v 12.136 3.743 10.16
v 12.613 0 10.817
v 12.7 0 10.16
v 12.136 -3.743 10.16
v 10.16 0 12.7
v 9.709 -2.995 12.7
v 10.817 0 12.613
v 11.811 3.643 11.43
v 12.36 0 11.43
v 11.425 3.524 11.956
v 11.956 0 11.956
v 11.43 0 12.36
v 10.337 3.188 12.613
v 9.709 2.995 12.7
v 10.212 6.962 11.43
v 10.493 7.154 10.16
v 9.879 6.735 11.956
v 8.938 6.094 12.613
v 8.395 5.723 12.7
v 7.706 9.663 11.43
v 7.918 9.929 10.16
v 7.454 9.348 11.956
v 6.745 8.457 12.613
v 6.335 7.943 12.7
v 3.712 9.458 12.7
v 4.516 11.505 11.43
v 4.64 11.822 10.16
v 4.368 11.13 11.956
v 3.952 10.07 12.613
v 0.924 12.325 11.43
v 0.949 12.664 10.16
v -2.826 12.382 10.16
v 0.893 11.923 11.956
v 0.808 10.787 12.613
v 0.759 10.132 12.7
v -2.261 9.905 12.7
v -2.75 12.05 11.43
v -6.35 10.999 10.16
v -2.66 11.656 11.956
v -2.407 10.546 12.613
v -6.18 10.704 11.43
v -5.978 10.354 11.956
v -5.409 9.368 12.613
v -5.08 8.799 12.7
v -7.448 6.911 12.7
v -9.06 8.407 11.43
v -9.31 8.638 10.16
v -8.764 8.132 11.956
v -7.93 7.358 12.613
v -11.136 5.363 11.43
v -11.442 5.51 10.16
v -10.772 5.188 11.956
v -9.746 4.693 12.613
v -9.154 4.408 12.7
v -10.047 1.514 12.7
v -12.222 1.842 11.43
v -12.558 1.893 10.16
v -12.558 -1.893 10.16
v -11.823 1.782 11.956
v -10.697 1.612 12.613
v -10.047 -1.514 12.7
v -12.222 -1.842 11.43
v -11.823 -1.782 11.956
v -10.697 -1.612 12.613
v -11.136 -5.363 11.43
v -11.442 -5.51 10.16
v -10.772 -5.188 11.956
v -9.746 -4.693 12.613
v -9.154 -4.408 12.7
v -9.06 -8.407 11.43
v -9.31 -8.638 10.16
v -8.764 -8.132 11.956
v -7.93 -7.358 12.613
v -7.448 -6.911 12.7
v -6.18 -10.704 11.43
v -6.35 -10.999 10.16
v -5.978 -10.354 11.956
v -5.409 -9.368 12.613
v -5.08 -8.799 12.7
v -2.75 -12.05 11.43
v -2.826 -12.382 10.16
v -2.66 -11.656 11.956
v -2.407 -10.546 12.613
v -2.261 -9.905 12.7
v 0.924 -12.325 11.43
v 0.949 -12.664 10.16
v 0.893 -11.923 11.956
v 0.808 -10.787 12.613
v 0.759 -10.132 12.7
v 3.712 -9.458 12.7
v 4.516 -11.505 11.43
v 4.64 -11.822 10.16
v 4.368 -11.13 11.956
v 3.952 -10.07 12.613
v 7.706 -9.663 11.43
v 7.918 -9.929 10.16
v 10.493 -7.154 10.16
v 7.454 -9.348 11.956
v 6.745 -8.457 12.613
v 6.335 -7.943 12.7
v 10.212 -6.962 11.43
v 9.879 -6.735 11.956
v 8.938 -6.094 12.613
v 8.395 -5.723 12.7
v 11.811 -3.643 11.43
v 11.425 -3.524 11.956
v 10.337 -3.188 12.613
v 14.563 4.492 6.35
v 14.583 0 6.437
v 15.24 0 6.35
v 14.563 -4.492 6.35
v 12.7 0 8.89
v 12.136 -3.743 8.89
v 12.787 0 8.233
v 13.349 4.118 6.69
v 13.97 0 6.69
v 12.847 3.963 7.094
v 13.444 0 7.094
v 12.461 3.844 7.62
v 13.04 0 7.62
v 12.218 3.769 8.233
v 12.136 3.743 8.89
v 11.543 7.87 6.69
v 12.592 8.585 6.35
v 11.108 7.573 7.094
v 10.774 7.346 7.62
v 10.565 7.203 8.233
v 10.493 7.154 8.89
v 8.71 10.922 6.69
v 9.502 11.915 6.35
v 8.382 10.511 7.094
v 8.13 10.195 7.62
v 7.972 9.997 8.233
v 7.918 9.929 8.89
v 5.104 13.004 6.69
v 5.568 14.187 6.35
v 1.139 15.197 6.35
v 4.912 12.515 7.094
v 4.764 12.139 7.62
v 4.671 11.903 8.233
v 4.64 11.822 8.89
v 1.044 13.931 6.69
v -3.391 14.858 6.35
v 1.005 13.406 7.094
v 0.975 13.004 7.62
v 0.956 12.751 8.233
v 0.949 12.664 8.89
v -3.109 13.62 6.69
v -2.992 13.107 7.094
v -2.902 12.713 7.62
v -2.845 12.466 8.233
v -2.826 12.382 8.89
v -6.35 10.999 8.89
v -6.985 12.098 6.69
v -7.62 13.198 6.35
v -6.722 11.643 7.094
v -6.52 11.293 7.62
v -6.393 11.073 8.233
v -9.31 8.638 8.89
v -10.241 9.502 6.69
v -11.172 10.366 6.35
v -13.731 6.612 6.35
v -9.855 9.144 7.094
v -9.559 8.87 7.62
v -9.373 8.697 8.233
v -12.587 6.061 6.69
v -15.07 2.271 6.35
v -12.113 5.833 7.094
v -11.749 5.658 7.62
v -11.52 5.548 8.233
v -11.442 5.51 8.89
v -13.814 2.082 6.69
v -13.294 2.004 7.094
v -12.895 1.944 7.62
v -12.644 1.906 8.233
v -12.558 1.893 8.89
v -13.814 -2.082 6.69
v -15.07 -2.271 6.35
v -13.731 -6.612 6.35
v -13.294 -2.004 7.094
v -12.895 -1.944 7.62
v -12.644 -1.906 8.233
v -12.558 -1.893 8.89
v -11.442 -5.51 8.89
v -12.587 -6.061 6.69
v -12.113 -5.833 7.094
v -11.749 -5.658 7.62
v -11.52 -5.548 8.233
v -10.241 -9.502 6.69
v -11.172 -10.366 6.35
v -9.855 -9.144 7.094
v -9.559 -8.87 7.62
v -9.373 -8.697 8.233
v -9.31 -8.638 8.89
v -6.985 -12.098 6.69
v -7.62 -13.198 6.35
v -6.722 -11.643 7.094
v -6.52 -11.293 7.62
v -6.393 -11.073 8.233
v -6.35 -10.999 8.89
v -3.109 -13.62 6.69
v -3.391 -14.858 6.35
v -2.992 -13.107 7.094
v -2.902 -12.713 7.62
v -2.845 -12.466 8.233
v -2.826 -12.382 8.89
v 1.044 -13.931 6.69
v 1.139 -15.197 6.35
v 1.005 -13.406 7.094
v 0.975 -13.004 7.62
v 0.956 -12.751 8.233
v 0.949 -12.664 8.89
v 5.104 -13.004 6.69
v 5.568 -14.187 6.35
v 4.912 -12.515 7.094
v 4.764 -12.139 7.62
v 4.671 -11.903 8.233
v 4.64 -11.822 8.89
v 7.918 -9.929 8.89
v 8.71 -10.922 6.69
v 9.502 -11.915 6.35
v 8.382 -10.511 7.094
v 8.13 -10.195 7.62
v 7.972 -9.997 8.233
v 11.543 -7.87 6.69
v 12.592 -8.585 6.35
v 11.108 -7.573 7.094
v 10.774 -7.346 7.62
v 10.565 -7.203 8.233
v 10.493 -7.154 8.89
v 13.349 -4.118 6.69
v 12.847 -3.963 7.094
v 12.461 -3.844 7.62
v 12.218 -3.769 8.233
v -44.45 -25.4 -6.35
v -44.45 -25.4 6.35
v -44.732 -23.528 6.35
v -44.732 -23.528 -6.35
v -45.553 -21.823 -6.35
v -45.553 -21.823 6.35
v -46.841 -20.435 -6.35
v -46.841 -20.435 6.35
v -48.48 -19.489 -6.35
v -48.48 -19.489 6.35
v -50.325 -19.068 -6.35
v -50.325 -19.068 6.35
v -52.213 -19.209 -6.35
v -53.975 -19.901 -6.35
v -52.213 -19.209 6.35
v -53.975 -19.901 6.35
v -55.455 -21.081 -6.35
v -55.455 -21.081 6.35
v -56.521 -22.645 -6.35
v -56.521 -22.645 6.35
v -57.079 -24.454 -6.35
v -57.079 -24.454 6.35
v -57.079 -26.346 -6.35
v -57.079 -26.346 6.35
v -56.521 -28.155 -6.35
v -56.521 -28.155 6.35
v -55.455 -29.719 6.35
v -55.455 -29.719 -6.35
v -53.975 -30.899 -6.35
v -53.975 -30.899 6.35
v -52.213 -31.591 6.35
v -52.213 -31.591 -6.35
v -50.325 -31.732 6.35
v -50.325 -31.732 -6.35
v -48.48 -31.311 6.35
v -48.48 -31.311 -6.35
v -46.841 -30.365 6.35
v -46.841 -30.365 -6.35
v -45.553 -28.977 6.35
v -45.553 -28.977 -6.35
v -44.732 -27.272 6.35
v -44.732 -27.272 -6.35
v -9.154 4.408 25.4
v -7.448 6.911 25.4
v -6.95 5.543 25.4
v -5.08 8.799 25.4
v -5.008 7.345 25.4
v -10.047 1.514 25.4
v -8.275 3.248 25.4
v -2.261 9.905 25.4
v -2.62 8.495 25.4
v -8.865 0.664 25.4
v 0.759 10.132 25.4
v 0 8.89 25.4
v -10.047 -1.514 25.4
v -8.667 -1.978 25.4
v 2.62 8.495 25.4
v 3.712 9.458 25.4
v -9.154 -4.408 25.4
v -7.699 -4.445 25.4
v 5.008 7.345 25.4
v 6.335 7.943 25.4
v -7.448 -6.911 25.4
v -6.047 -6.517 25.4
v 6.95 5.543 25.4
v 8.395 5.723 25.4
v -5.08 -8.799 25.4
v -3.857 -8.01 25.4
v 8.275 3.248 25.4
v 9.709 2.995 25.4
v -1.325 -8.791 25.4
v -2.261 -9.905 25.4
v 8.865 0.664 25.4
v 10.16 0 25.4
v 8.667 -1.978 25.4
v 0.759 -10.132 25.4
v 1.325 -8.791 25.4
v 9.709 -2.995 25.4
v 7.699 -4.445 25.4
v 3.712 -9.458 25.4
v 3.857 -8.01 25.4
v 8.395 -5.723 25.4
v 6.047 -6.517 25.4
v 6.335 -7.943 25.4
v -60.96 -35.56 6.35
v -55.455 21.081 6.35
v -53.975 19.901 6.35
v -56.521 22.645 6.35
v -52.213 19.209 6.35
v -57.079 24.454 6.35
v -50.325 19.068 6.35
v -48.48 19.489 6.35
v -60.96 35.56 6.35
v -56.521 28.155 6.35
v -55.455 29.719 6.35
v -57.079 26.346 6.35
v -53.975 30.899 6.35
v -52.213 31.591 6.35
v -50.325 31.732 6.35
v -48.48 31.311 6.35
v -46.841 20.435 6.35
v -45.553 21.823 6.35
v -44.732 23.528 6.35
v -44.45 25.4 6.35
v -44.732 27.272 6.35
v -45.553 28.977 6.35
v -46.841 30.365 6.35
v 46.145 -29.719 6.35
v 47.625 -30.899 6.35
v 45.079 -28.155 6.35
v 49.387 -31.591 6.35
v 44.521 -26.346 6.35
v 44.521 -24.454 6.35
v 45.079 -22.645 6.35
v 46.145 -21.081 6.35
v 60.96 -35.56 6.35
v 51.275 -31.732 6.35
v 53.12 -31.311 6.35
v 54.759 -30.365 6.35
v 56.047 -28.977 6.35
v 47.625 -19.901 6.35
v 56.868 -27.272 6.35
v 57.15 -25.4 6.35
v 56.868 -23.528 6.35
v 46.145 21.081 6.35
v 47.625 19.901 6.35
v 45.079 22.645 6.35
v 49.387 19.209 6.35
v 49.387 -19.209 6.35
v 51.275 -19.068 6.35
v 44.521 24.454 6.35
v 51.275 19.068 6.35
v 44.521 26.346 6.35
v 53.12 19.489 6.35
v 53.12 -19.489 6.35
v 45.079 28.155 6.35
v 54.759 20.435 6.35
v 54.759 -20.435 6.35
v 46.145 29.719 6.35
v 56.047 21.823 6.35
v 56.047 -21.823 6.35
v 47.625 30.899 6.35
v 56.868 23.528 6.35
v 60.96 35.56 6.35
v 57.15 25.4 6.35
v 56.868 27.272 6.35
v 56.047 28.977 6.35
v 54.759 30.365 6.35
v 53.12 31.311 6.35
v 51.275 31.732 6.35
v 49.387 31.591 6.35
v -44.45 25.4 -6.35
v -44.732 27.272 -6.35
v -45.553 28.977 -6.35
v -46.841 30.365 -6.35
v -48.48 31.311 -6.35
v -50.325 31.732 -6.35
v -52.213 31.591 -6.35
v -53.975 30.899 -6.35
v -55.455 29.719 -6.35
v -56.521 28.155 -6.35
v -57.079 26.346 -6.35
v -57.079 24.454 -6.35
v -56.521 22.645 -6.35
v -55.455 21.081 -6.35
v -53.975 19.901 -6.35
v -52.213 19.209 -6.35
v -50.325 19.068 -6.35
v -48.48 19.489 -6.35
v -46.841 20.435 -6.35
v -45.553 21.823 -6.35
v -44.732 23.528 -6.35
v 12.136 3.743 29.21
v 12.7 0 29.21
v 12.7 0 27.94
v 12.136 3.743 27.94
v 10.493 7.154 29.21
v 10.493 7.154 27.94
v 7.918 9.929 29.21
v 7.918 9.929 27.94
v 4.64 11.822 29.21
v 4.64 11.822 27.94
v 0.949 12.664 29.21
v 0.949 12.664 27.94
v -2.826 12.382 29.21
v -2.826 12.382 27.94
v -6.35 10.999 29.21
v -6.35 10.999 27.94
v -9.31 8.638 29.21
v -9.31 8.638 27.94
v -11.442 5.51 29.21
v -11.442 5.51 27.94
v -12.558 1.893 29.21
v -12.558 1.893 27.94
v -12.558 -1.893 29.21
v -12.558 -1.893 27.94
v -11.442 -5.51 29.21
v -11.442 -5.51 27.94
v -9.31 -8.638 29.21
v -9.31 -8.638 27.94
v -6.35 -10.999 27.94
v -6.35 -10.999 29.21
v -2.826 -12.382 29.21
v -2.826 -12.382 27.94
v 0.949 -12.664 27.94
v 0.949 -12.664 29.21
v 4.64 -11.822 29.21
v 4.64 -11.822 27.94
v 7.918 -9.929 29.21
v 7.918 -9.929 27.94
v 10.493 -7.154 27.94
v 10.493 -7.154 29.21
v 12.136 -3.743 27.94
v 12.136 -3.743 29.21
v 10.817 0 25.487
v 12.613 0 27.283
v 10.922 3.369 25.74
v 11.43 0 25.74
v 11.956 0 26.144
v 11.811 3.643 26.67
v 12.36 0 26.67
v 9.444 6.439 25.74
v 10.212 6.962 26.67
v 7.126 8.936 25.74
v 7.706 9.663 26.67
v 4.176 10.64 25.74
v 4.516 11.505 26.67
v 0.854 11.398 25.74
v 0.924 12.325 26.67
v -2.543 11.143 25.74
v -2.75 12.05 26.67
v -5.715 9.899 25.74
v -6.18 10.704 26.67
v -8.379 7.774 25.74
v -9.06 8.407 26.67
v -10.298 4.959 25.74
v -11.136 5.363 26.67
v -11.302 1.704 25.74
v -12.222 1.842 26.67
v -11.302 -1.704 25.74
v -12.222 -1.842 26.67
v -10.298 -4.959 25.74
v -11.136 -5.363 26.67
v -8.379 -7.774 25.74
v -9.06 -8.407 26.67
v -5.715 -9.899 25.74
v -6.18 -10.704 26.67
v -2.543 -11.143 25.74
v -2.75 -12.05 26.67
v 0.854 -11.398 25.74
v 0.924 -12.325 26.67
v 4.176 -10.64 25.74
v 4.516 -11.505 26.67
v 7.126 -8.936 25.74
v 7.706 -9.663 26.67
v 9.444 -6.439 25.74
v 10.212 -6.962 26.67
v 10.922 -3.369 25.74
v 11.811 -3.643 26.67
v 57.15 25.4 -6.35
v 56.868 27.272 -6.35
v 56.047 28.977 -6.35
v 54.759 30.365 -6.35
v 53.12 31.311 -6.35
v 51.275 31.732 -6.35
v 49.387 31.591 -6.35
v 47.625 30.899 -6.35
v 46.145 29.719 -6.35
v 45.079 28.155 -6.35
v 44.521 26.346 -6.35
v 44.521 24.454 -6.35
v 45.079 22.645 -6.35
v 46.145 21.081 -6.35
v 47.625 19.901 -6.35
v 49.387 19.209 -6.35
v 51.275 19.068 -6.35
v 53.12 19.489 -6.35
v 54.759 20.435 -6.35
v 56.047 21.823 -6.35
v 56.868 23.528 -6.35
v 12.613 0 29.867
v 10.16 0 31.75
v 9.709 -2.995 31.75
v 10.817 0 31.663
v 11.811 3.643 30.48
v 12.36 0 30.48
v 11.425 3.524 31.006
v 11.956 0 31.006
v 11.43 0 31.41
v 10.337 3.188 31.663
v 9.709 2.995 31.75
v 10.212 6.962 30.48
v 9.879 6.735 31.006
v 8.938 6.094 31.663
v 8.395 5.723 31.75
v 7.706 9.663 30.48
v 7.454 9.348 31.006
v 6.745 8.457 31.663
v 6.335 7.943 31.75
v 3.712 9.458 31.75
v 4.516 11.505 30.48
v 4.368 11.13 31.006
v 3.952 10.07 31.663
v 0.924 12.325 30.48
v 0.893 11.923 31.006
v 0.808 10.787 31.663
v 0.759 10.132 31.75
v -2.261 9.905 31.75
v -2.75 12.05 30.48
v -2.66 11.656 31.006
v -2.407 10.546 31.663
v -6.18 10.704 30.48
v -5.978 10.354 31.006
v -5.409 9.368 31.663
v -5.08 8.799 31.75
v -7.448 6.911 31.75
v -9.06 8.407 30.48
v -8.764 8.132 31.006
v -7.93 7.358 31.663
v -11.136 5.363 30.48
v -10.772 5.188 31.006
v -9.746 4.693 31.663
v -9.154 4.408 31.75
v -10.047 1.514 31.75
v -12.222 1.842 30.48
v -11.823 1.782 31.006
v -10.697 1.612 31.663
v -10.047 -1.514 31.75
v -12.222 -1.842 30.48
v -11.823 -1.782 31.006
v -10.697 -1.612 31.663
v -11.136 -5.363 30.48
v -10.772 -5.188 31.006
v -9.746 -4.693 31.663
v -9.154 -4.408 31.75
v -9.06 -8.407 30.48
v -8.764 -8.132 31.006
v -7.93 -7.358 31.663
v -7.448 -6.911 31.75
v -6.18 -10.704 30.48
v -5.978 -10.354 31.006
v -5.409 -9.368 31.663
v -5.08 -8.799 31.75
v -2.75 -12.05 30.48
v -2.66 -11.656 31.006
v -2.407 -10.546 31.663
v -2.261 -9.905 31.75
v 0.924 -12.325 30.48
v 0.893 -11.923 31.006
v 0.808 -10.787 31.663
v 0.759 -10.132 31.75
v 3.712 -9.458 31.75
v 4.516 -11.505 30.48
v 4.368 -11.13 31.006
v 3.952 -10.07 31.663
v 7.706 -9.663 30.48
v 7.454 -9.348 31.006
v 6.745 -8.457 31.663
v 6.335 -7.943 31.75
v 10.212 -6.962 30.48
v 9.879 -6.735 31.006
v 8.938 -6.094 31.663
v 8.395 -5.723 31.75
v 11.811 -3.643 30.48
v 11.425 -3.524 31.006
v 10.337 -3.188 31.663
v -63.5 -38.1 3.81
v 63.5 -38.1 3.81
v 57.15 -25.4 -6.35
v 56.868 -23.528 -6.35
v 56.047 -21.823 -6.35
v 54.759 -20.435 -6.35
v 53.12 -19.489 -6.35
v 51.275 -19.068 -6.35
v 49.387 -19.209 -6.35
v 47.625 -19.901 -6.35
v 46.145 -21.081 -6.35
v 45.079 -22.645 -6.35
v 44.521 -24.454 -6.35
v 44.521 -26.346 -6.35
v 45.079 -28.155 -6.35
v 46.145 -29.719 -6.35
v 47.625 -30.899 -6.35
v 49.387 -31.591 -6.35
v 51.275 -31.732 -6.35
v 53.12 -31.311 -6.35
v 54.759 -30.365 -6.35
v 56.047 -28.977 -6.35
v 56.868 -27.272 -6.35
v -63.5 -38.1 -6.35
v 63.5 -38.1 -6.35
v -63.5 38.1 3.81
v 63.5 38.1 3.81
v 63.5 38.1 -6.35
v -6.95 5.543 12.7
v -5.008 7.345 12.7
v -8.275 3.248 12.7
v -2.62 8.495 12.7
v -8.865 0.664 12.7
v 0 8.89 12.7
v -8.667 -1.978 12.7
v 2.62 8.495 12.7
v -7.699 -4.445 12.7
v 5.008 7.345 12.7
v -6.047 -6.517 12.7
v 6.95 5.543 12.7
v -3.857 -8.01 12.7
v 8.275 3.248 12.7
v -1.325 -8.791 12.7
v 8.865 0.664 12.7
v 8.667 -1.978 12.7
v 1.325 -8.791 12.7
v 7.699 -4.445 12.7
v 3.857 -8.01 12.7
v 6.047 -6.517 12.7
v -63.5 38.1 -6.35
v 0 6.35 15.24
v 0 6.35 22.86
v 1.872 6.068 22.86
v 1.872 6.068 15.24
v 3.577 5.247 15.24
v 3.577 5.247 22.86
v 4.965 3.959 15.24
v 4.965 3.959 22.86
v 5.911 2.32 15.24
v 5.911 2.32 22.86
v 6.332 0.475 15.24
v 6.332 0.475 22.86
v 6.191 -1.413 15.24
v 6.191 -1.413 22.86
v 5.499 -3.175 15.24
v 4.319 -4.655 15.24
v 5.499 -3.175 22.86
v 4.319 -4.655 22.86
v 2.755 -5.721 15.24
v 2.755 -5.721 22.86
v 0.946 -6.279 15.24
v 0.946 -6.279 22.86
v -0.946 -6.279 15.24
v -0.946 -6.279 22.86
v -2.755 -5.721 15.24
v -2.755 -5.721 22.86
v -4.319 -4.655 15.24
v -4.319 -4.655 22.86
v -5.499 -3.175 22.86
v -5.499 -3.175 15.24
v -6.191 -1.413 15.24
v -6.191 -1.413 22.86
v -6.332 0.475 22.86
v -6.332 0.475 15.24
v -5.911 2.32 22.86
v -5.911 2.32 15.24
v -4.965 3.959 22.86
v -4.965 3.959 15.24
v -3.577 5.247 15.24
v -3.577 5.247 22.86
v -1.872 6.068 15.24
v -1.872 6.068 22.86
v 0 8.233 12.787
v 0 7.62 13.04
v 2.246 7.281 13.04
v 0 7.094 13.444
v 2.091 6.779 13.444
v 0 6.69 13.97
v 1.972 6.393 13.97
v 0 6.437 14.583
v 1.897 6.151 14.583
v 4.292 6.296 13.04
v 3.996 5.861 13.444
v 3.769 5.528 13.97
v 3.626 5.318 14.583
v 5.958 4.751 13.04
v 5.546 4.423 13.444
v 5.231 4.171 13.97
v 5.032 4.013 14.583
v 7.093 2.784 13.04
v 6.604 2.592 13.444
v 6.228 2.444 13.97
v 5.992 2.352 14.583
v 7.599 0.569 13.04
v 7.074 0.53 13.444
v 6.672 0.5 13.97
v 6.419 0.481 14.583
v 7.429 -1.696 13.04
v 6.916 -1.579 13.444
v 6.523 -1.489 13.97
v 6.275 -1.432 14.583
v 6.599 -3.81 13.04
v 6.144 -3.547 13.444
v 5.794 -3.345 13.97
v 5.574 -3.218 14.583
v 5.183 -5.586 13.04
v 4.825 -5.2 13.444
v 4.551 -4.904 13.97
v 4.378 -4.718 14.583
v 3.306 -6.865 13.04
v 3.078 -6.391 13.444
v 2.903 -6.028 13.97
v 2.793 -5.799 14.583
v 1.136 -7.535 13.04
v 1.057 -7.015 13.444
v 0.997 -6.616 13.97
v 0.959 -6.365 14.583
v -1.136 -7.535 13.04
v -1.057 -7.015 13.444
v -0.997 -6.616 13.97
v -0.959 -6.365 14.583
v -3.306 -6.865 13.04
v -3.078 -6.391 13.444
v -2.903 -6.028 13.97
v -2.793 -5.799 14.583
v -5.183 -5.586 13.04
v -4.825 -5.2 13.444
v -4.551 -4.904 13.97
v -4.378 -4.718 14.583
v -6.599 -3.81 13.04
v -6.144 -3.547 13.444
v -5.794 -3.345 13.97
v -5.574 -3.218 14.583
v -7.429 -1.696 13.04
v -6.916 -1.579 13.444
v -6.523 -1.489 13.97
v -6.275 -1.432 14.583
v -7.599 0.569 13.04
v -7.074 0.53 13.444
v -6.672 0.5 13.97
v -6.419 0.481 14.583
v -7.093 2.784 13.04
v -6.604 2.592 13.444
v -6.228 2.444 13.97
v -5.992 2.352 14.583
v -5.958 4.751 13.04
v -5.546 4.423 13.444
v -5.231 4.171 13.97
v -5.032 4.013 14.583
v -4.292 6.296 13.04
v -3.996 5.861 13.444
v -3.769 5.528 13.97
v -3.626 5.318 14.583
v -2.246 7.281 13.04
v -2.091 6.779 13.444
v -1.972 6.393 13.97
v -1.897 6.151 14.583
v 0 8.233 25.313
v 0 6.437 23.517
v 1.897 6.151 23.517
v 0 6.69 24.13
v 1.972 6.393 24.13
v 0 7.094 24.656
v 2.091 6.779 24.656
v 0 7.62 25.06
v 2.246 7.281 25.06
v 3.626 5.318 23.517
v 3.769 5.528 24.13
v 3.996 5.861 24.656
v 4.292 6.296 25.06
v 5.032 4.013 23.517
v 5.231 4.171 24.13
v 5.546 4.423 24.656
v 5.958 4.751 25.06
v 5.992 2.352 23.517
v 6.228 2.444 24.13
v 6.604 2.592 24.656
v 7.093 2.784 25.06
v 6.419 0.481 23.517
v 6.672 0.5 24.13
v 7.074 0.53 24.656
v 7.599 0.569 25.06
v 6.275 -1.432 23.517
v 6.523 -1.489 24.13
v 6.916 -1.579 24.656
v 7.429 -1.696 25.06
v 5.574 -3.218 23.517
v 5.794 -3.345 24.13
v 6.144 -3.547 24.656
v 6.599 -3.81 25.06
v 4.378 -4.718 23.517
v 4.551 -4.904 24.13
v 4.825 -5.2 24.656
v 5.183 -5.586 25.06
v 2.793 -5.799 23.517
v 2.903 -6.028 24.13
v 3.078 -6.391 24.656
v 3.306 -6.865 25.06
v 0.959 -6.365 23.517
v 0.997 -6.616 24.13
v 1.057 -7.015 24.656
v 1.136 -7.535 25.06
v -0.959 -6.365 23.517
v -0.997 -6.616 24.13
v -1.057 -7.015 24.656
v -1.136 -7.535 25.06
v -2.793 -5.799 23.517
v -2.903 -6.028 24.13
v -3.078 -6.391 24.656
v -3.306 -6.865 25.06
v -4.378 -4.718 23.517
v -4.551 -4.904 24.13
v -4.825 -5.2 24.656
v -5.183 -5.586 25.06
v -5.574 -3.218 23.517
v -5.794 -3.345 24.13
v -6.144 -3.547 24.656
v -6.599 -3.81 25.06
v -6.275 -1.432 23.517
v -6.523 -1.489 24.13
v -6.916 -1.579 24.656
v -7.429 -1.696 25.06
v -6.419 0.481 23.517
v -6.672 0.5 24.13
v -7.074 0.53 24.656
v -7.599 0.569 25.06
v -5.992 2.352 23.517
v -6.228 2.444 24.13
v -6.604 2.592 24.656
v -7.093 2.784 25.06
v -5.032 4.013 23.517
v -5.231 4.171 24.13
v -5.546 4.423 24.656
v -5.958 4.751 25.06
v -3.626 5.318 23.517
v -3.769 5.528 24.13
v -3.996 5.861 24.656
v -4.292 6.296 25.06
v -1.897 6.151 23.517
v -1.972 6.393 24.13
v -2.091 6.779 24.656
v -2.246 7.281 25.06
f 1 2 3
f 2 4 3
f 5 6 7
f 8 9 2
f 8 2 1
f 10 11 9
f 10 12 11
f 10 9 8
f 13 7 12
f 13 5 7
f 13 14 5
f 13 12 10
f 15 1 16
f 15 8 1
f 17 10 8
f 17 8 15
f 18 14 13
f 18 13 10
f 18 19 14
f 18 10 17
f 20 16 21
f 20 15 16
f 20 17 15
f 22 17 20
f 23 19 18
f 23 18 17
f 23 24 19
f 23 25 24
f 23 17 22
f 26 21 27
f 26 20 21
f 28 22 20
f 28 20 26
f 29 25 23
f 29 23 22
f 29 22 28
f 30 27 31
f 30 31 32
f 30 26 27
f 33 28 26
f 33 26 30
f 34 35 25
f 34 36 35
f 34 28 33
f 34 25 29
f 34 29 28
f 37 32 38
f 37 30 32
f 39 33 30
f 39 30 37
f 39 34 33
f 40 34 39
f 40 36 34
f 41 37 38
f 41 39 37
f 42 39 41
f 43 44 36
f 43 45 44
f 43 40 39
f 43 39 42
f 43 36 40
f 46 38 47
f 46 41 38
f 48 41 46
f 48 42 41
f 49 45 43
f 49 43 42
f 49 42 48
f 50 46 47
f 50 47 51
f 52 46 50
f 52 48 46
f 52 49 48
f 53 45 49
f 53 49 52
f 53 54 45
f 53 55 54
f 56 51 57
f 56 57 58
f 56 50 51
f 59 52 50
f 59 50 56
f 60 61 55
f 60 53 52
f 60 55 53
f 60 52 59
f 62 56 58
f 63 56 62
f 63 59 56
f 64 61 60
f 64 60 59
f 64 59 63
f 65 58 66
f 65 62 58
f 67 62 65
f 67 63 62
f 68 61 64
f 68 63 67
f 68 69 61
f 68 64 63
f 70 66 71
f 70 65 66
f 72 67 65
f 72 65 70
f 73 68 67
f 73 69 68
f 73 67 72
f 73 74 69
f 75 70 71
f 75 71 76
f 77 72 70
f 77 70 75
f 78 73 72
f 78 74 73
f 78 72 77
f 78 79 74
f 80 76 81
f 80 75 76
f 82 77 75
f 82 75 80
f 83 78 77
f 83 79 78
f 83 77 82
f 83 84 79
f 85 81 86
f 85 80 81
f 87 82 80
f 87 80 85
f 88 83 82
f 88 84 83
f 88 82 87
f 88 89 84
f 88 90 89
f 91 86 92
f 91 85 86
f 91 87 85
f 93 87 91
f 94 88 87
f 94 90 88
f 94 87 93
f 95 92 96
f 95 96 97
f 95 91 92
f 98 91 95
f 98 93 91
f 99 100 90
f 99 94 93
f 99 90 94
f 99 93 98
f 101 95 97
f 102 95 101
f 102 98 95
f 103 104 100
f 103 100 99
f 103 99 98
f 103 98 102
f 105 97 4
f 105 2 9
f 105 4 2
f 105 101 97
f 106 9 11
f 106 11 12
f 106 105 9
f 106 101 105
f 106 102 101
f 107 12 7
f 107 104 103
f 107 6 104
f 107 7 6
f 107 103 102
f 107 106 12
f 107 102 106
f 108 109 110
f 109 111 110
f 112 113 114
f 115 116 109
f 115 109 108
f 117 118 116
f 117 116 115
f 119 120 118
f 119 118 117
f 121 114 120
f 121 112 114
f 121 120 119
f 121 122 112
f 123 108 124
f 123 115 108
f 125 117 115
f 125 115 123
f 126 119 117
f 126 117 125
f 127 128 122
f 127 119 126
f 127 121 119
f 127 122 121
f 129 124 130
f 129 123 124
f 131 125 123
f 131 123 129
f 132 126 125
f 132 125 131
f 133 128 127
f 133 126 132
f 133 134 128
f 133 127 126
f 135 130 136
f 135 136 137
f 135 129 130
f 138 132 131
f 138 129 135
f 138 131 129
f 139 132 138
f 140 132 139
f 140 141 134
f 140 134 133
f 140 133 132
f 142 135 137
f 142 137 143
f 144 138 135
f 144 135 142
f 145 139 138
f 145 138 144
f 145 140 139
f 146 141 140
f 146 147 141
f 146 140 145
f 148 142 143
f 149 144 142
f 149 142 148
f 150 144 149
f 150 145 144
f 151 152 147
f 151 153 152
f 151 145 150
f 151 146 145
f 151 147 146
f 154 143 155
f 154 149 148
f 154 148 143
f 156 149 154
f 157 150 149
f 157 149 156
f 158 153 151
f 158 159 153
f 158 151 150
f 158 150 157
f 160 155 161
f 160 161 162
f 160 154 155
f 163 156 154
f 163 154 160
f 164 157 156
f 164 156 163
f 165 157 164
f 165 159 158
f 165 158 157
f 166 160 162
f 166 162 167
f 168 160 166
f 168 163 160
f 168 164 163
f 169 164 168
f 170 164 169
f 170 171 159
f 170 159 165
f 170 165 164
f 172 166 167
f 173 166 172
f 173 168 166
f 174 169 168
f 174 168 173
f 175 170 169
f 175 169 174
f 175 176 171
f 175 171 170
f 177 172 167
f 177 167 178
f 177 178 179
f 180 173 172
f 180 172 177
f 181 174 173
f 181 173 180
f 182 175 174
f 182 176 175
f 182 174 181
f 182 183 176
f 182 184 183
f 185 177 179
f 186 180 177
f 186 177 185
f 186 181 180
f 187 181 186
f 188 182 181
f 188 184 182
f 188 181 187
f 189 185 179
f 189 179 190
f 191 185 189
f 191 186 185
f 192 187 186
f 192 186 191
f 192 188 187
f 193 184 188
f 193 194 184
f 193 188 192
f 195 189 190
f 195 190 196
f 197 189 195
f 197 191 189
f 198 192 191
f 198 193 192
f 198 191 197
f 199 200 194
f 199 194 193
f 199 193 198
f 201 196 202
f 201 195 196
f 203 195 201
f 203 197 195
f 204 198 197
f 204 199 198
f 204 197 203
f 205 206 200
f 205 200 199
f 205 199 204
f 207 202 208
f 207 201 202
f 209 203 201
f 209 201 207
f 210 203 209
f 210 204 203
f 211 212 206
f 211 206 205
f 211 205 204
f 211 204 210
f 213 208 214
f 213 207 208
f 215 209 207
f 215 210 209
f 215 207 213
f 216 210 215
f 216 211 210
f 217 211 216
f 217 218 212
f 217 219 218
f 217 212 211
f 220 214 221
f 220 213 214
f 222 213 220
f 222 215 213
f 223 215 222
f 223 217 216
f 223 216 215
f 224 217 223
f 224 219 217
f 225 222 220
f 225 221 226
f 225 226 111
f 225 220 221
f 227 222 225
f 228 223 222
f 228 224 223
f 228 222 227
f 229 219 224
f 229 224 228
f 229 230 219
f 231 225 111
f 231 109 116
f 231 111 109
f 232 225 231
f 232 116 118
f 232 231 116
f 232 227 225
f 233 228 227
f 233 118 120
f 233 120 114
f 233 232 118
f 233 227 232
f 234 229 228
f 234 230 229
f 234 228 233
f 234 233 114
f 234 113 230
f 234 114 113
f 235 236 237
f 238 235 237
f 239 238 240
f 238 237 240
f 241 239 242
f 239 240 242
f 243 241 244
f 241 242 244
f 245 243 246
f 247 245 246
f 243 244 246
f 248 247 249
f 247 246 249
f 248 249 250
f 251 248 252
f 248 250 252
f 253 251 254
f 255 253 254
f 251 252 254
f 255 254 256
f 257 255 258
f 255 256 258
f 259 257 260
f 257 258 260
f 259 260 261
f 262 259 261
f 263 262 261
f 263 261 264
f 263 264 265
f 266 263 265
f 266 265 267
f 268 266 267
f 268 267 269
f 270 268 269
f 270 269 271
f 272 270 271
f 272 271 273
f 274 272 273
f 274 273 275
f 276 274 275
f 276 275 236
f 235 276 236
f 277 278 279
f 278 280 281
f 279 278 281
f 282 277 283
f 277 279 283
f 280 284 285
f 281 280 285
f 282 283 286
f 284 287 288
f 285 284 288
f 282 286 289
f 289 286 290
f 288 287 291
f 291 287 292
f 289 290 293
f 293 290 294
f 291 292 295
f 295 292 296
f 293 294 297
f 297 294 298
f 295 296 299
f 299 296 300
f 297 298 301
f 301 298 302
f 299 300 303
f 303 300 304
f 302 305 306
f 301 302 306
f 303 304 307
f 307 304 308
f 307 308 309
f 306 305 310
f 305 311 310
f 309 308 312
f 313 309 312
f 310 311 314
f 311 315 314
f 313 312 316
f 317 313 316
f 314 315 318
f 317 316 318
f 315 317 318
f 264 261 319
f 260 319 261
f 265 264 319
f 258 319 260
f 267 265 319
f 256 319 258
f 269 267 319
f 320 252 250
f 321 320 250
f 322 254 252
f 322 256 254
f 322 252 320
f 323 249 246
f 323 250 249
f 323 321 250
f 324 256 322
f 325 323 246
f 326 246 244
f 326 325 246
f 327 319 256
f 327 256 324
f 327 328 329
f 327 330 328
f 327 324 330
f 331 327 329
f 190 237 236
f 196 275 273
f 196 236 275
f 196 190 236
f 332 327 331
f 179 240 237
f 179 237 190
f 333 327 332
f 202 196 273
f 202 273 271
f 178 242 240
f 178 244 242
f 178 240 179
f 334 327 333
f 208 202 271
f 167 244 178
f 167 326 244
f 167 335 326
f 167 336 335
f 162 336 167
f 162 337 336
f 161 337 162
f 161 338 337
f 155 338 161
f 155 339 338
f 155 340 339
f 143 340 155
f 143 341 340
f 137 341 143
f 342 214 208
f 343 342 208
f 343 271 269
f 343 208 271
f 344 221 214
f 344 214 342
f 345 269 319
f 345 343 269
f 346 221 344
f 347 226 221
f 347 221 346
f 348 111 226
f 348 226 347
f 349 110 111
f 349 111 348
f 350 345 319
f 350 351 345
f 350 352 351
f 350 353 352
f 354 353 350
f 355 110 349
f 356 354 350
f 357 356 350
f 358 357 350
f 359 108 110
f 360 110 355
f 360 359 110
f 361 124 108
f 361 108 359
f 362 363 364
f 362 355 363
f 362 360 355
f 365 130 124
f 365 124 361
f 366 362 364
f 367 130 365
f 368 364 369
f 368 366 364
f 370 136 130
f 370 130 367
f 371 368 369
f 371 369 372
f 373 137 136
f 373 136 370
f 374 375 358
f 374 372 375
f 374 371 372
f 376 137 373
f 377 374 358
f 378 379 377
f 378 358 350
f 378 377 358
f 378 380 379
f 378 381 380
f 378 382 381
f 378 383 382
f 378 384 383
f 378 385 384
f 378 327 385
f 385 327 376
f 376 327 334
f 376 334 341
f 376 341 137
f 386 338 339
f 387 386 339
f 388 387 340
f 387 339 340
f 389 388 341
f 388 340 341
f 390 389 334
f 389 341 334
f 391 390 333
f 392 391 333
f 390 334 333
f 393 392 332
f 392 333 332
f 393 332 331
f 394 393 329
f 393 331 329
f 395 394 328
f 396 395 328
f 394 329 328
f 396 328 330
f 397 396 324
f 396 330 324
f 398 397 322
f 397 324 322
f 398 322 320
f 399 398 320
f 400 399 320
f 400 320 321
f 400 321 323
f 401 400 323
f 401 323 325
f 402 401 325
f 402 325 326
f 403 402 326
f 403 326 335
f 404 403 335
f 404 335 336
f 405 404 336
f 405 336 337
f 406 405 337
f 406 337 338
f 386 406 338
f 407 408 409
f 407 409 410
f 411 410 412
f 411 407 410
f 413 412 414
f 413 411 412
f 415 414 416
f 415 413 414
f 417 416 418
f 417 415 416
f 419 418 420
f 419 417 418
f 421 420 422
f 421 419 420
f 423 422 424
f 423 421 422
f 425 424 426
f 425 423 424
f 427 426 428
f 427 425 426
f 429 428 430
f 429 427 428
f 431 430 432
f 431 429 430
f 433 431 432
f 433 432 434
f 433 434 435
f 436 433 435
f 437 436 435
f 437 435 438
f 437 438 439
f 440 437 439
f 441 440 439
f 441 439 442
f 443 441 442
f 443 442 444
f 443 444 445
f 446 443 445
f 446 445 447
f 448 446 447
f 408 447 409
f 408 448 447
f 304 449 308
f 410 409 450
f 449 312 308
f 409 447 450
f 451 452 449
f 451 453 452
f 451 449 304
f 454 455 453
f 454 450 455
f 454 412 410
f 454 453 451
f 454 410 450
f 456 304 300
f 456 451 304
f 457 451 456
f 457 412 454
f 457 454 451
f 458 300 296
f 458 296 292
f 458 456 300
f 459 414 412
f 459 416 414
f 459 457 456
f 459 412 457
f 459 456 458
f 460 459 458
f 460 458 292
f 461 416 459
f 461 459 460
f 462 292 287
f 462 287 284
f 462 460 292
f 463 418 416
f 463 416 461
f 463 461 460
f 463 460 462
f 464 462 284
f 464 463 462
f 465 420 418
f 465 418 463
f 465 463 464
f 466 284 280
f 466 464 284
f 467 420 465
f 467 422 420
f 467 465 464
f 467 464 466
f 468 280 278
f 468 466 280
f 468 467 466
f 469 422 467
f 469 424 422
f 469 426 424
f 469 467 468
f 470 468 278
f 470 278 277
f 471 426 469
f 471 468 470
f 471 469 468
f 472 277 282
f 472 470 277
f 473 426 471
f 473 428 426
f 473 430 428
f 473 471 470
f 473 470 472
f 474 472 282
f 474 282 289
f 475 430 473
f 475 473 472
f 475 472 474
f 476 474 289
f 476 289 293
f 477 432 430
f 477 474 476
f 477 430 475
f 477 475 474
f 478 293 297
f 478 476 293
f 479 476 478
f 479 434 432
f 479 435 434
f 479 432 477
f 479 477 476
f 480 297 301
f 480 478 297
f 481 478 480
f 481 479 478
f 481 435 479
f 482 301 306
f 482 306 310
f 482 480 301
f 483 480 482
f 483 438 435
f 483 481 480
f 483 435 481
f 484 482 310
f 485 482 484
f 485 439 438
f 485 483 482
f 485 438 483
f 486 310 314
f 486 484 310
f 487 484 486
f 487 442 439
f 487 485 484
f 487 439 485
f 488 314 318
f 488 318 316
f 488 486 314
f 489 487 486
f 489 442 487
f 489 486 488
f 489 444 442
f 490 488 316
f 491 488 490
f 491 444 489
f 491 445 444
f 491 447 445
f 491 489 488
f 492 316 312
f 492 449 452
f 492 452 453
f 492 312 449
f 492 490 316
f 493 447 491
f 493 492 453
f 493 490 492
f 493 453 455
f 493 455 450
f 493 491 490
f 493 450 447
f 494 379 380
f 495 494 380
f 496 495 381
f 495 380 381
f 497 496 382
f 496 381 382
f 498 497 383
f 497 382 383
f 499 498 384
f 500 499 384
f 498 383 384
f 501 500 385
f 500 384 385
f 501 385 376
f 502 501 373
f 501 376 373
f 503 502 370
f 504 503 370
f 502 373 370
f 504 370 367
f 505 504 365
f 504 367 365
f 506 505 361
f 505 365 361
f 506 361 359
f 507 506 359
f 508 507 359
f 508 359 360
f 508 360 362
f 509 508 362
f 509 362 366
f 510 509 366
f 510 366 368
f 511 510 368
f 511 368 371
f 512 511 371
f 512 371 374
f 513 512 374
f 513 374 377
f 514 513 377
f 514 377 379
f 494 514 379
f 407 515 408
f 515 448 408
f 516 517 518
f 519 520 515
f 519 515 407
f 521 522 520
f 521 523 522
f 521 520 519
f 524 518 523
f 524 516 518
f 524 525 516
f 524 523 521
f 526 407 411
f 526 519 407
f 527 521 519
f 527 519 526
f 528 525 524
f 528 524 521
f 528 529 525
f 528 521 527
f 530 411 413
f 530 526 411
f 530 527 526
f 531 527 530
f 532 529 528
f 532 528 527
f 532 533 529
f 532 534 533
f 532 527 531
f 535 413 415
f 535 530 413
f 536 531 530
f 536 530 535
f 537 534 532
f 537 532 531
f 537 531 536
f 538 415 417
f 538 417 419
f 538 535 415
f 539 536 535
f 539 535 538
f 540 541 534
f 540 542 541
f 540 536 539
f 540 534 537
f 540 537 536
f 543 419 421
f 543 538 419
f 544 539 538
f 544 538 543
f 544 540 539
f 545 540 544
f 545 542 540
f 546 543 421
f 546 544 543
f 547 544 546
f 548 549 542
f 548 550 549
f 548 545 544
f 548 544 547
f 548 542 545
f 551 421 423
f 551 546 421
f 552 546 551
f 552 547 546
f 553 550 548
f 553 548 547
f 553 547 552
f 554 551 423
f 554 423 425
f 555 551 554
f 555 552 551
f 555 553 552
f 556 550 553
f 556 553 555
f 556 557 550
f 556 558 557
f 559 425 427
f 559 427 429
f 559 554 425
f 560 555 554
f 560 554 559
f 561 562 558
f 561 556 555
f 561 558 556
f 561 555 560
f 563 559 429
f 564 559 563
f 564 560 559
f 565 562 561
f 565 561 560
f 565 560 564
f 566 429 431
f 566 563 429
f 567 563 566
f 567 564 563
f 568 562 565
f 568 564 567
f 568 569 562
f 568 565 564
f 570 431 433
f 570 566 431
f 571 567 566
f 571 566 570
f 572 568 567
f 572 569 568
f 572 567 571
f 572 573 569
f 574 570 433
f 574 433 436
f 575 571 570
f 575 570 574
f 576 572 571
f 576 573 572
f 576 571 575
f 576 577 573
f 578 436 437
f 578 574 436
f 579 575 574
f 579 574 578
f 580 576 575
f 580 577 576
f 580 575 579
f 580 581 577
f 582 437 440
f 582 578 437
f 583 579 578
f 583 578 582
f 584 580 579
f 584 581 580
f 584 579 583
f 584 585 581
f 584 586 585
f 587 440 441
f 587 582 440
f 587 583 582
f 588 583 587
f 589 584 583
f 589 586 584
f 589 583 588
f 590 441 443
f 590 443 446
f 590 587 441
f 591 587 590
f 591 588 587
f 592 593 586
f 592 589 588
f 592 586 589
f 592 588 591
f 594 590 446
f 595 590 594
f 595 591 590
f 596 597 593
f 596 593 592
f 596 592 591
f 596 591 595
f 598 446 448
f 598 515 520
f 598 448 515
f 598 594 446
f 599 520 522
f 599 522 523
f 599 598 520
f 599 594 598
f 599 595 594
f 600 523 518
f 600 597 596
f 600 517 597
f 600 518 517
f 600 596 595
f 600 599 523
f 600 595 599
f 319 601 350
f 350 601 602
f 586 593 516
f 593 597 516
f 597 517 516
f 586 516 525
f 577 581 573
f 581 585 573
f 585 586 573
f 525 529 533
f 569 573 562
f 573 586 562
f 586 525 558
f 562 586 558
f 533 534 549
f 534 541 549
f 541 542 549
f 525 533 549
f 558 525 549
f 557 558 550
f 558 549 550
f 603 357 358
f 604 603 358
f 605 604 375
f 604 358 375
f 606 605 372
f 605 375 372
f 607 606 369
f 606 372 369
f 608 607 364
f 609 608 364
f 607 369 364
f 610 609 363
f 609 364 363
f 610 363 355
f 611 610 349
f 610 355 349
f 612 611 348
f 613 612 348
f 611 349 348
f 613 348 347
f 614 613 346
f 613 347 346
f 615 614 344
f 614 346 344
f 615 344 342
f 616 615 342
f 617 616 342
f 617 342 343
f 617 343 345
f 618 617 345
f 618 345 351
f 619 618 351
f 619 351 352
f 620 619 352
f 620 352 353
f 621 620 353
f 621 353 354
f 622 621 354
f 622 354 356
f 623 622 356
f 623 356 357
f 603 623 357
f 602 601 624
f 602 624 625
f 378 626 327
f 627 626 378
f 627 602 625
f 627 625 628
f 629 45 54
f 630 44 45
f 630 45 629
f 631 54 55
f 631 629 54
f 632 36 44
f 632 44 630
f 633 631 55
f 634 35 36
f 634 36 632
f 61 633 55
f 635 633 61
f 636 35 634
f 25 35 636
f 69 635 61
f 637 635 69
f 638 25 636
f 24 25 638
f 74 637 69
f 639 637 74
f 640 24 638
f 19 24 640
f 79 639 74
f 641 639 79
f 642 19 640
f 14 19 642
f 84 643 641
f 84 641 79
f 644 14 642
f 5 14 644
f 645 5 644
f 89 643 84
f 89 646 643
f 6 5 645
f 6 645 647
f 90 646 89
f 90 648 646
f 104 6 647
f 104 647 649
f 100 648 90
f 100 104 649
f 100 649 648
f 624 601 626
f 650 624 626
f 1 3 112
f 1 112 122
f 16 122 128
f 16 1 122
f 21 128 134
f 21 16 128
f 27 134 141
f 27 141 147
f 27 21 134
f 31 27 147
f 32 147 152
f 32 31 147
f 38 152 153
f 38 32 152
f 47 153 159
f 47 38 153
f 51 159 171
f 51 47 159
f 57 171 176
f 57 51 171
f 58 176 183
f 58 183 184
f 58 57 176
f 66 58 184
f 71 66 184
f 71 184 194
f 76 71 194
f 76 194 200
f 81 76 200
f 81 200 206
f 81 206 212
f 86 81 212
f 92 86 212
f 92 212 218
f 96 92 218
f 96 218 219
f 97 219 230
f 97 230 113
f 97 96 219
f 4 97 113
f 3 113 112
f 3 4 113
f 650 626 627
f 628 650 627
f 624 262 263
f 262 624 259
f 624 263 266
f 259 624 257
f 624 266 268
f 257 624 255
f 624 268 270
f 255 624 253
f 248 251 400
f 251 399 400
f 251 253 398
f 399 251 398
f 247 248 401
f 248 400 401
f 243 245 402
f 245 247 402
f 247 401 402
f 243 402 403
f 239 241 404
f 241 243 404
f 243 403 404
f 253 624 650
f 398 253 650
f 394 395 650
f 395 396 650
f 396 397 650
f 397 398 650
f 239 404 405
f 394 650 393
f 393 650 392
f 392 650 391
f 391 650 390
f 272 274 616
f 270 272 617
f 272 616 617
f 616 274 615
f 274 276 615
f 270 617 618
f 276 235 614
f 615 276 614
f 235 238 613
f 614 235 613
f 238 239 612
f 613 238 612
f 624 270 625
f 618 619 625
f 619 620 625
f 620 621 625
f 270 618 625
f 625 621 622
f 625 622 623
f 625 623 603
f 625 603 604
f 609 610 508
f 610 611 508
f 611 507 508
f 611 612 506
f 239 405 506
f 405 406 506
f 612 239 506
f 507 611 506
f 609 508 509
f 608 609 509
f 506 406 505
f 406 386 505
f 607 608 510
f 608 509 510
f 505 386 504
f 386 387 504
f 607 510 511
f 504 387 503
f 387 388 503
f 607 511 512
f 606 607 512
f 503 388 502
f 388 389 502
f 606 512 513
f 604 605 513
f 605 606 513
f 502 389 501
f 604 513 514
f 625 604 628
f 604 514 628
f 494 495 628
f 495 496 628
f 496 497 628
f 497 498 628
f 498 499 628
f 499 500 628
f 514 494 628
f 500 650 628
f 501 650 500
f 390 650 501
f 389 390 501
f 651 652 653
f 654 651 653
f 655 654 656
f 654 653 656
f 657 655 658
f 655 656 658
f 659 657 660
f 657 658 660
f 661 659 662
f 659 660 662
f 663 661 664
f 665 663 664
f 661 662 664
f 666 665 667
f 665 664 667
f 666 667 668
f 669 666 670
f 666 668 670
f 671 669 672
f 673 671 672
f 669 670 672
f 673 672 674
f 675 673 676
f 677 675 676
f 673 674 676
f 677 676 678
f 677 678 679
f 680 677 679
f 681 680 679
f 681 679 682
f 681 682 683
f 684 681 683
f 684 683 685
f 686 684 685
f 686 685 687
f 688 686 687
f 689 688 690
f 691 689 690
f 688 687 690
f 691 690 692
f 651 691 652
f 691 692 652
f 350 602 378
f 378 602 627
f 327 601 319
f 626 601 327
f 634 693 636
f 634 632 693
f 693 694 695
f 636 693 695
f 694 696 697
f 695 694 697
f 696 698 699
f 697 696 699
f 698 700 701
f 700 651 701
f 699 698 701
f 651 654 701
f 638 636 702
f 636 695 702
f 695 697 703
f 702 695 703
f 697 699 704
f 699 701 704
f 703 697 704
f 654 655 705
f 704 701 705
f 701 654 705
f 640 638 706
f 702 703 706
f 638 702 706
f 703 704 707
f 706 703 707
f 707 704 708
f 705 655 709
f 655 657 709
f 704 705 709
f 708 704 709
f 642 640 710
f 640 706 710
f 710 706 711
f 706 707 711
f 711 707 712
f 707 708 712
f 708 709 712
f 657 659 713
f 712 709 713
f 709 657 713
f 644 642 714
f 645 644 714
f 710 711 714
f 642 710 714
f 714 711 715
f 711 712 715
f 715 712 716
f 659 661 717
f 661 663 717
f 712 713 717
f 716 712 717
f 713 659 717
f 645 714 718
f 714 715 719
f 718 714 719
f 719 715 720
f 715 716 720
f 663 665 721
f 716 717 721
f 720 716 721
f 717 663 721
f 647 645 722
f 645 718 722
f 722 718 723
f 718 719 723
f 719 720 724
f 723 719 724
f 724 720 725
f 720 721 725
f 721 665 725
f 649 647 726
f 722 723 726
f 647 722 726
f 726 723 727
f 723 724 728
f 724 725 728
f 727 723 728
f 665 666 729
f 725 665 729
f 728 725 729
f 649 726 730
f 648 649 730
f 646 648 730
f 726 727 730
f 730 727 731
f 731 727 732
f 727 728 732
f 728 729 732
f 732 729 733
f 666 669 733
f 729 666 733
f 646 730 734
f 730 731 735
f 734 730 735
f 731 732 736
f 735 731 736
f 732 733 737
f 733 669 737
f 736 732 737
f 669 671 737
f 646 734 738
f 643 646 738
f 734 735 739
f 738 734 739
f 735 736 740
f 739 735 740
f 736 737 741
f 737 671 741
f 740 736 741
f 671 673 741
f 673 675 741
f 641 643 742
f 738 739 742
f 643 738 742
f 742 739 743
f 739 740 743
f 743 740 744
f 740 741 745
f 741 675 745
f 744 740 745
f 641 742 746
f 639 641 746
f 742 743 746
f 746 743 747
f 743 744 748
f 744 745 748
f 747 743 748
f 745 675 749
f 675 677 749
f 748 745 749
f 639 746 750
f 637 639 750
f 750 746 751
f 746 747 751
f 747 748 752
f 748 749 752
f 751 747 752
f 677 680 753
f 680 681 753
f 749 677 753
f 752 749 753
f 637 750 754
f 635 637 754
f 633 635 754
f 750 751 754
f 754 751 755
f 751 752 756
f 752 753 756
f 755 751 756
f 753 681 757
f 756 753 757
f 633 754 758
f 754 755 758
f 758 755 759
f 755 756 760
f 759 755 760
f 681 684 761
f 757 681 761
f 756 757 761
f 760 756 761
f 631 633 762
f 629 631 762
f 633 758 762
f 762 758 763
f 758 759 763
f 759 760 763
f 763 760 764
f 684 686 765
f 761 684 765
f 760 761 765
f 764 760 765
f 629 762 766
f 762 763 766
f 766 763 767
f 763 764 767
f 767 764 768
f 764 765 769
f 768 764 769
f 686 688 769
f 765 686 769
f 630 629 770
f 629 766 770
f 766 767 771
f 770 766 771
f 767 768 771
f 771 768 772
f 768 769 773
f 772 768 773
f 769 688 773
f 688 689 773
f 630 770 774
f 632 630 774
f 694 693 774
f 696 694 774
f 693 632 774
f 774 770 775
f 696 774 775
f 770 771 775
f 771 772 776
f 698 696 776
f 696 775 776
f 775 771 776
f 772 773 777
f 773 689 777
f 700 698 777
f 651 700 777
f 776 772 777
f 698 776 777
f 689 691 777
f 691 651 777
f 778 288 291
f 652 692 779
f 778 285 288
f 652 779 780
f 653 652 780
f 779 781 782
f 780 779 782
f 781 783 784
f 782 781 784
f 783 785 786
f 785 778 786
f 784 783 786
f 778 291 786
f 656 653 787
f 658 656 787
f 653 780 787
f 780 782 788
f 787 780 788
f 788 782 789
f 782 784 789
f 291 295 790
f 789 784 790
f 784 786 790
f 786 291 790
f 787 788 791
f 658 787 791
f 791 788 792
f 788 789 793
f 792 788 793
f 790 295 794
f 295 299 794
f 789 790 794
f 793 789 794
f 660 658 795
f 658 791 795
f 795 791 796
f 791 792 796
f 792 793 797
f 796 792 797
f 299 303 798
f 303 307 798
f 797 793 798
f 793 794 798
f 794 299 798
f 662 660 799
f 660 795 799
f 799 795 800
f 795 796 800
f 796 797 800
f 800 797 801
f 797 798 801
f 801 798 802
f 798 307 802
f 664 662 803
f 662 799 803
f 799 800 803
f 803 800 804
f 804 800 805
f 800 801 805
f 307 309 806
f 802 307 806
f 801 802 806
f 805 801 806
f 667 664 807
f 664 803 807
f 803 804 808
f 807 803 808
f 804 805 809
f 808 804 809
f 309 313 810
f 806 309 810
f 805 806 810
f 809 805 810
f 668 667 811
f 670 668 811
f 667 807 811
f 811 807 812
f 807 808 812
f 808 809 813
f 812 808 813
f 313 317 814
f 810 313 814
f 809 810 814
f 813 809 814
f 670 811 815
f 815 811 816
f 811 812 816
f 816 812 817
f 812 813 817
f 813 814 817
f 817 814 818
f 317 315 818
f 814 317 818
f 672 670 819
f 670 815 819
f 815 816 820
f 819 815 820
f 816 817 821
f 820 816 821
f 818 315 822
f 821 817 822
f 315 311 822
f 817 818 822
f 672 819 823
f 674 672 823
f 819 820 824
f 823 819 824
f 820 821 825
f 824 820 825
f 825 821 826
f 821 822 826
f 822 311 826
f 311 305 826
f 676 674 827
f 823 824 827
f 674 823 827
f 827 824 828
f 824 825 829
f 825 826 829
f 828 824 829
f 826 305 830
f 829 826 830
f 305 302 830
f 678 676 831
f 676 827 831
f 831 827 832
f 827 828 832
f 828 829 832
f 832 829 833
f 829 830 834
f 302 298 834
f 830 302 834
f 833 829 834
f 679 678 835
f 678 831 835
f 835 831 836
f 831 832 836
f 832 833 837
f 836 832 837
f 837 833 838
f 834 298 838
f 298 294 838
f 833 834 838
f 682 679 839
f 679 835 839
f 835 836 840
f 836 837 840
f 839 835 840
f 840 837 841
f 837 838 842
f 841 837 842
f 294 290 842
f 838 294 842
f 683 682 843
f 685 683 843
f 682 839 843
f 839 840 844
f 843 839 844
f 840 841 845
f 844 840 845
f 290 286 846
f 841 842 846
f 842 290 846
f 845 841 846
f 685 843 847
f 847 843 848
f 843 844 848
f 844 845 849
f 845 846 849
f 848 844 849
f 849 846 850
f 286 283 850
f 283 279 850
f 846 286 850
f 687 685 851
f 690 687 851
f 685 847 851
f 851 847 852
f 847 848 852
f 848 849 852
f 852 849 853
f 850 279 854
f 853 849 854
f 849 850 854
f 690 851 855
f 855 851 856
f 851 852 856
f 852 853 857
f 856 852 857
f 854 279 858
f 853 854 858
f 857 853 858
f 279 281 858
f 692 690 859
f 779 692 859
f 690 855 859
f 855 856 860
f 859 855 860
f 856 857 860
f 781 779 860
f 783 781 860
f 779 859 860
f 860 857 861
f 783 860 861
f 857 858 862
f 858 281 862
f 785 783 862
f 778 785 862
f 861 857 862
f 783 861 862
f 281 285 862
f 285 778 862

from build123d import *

# Parameters (mm, degrees)
F0_W     = 127
F0_H     = 76.2
F1_DEPTH = 6.35
F2_R     = 6.35
F3_DEPTH = 25.4
F4_W     = 12.7
F4_H     = 25.4
F6_W     = 12.7
F6_H     = 12.7
F8_R     = 2.54
F9_SIZE  = 2.54
F10_R    = 2.54
F11_R    = 2.54


with BuildPart() as f1:
    # F0 (on Top) → F1 (new body, symmetric)
    with BuildSketch(Plane.XY):
        Rectangle(F0_W, F0_H)
    extrude(amount=F1_DEPTH, both=True)

    # F2 (on face) → F3 (cut)
    with BuildSketch(Plane.XY.offset(6.35)):
        with Locations((-50.8, 25.4)):
            Circle(F2_R)
        with Locations((50.8, 25.4)):
            Circle(F2_R)
        with Locations((50.8, -25.4)):
            Circle(F2_R)
        with Locations((-50.8, -25.4)):
            Circle(F2_R)
    extrude(amount=-F3_DEPTH, mode=Mode.SUBTRACT)

    # F4 (on Front) → F5 (revolve)
    with BuildSketch(Plane.XZ):
        with Locations((6.35, 19.05)):
            Rectangle(F4_W, F4_H)
    revolve(axis=Axis((0, 0, 19.05), (0, 0, 1)))

    # F6 (on Right) → F7 (revolve, cut)
    with BuildSketch(Plane.YZ):
        with Locations((12.7, 19.05)):
            Rectangle(F6_W, F6_H)
    revolve(axis=Axis((0, 0, 19.0770364478), (0, 0, -1)), mode=Mode.SUBTRACT)

    # F8
    f8_edges = [f1.edges().sort_by_distance(p)[0] for p in [
        (-12.7, 0, 31.75),
        (-12.7, 0, 6.35),
    ]]
    fillet(f8_edges, radius=F8_R)

    # F9
    f9_edges = [f1.edges().sort_by_distance(p)[0] for p in [
        (0, 38.1, 6.35),
        (-63.5, 0, 6.35),
        (0, -38.1, 6.35),
        (63.5, 0, 6.35),
    ]]
    chamfer(f9_edges, length=F9_SIZE)

    # F10
    f10_edges = [f1.edges().sort_by_distance(p)[0] for p in [
        (-12.7, 0, 25.4),
        (-12.7, 0, 12.7),
    ]]
    fillet(f10_edges, radius=F10_R)

    # F11
    f11_edges = [f1.edges().sort_by_distance(p)[0] for p in [
        (0, -6.35, 12.7),
        (0, -6.35, 25.4),
    ]]
    fillet(f11_edges, radius=F11_R)


solid = f1.part
